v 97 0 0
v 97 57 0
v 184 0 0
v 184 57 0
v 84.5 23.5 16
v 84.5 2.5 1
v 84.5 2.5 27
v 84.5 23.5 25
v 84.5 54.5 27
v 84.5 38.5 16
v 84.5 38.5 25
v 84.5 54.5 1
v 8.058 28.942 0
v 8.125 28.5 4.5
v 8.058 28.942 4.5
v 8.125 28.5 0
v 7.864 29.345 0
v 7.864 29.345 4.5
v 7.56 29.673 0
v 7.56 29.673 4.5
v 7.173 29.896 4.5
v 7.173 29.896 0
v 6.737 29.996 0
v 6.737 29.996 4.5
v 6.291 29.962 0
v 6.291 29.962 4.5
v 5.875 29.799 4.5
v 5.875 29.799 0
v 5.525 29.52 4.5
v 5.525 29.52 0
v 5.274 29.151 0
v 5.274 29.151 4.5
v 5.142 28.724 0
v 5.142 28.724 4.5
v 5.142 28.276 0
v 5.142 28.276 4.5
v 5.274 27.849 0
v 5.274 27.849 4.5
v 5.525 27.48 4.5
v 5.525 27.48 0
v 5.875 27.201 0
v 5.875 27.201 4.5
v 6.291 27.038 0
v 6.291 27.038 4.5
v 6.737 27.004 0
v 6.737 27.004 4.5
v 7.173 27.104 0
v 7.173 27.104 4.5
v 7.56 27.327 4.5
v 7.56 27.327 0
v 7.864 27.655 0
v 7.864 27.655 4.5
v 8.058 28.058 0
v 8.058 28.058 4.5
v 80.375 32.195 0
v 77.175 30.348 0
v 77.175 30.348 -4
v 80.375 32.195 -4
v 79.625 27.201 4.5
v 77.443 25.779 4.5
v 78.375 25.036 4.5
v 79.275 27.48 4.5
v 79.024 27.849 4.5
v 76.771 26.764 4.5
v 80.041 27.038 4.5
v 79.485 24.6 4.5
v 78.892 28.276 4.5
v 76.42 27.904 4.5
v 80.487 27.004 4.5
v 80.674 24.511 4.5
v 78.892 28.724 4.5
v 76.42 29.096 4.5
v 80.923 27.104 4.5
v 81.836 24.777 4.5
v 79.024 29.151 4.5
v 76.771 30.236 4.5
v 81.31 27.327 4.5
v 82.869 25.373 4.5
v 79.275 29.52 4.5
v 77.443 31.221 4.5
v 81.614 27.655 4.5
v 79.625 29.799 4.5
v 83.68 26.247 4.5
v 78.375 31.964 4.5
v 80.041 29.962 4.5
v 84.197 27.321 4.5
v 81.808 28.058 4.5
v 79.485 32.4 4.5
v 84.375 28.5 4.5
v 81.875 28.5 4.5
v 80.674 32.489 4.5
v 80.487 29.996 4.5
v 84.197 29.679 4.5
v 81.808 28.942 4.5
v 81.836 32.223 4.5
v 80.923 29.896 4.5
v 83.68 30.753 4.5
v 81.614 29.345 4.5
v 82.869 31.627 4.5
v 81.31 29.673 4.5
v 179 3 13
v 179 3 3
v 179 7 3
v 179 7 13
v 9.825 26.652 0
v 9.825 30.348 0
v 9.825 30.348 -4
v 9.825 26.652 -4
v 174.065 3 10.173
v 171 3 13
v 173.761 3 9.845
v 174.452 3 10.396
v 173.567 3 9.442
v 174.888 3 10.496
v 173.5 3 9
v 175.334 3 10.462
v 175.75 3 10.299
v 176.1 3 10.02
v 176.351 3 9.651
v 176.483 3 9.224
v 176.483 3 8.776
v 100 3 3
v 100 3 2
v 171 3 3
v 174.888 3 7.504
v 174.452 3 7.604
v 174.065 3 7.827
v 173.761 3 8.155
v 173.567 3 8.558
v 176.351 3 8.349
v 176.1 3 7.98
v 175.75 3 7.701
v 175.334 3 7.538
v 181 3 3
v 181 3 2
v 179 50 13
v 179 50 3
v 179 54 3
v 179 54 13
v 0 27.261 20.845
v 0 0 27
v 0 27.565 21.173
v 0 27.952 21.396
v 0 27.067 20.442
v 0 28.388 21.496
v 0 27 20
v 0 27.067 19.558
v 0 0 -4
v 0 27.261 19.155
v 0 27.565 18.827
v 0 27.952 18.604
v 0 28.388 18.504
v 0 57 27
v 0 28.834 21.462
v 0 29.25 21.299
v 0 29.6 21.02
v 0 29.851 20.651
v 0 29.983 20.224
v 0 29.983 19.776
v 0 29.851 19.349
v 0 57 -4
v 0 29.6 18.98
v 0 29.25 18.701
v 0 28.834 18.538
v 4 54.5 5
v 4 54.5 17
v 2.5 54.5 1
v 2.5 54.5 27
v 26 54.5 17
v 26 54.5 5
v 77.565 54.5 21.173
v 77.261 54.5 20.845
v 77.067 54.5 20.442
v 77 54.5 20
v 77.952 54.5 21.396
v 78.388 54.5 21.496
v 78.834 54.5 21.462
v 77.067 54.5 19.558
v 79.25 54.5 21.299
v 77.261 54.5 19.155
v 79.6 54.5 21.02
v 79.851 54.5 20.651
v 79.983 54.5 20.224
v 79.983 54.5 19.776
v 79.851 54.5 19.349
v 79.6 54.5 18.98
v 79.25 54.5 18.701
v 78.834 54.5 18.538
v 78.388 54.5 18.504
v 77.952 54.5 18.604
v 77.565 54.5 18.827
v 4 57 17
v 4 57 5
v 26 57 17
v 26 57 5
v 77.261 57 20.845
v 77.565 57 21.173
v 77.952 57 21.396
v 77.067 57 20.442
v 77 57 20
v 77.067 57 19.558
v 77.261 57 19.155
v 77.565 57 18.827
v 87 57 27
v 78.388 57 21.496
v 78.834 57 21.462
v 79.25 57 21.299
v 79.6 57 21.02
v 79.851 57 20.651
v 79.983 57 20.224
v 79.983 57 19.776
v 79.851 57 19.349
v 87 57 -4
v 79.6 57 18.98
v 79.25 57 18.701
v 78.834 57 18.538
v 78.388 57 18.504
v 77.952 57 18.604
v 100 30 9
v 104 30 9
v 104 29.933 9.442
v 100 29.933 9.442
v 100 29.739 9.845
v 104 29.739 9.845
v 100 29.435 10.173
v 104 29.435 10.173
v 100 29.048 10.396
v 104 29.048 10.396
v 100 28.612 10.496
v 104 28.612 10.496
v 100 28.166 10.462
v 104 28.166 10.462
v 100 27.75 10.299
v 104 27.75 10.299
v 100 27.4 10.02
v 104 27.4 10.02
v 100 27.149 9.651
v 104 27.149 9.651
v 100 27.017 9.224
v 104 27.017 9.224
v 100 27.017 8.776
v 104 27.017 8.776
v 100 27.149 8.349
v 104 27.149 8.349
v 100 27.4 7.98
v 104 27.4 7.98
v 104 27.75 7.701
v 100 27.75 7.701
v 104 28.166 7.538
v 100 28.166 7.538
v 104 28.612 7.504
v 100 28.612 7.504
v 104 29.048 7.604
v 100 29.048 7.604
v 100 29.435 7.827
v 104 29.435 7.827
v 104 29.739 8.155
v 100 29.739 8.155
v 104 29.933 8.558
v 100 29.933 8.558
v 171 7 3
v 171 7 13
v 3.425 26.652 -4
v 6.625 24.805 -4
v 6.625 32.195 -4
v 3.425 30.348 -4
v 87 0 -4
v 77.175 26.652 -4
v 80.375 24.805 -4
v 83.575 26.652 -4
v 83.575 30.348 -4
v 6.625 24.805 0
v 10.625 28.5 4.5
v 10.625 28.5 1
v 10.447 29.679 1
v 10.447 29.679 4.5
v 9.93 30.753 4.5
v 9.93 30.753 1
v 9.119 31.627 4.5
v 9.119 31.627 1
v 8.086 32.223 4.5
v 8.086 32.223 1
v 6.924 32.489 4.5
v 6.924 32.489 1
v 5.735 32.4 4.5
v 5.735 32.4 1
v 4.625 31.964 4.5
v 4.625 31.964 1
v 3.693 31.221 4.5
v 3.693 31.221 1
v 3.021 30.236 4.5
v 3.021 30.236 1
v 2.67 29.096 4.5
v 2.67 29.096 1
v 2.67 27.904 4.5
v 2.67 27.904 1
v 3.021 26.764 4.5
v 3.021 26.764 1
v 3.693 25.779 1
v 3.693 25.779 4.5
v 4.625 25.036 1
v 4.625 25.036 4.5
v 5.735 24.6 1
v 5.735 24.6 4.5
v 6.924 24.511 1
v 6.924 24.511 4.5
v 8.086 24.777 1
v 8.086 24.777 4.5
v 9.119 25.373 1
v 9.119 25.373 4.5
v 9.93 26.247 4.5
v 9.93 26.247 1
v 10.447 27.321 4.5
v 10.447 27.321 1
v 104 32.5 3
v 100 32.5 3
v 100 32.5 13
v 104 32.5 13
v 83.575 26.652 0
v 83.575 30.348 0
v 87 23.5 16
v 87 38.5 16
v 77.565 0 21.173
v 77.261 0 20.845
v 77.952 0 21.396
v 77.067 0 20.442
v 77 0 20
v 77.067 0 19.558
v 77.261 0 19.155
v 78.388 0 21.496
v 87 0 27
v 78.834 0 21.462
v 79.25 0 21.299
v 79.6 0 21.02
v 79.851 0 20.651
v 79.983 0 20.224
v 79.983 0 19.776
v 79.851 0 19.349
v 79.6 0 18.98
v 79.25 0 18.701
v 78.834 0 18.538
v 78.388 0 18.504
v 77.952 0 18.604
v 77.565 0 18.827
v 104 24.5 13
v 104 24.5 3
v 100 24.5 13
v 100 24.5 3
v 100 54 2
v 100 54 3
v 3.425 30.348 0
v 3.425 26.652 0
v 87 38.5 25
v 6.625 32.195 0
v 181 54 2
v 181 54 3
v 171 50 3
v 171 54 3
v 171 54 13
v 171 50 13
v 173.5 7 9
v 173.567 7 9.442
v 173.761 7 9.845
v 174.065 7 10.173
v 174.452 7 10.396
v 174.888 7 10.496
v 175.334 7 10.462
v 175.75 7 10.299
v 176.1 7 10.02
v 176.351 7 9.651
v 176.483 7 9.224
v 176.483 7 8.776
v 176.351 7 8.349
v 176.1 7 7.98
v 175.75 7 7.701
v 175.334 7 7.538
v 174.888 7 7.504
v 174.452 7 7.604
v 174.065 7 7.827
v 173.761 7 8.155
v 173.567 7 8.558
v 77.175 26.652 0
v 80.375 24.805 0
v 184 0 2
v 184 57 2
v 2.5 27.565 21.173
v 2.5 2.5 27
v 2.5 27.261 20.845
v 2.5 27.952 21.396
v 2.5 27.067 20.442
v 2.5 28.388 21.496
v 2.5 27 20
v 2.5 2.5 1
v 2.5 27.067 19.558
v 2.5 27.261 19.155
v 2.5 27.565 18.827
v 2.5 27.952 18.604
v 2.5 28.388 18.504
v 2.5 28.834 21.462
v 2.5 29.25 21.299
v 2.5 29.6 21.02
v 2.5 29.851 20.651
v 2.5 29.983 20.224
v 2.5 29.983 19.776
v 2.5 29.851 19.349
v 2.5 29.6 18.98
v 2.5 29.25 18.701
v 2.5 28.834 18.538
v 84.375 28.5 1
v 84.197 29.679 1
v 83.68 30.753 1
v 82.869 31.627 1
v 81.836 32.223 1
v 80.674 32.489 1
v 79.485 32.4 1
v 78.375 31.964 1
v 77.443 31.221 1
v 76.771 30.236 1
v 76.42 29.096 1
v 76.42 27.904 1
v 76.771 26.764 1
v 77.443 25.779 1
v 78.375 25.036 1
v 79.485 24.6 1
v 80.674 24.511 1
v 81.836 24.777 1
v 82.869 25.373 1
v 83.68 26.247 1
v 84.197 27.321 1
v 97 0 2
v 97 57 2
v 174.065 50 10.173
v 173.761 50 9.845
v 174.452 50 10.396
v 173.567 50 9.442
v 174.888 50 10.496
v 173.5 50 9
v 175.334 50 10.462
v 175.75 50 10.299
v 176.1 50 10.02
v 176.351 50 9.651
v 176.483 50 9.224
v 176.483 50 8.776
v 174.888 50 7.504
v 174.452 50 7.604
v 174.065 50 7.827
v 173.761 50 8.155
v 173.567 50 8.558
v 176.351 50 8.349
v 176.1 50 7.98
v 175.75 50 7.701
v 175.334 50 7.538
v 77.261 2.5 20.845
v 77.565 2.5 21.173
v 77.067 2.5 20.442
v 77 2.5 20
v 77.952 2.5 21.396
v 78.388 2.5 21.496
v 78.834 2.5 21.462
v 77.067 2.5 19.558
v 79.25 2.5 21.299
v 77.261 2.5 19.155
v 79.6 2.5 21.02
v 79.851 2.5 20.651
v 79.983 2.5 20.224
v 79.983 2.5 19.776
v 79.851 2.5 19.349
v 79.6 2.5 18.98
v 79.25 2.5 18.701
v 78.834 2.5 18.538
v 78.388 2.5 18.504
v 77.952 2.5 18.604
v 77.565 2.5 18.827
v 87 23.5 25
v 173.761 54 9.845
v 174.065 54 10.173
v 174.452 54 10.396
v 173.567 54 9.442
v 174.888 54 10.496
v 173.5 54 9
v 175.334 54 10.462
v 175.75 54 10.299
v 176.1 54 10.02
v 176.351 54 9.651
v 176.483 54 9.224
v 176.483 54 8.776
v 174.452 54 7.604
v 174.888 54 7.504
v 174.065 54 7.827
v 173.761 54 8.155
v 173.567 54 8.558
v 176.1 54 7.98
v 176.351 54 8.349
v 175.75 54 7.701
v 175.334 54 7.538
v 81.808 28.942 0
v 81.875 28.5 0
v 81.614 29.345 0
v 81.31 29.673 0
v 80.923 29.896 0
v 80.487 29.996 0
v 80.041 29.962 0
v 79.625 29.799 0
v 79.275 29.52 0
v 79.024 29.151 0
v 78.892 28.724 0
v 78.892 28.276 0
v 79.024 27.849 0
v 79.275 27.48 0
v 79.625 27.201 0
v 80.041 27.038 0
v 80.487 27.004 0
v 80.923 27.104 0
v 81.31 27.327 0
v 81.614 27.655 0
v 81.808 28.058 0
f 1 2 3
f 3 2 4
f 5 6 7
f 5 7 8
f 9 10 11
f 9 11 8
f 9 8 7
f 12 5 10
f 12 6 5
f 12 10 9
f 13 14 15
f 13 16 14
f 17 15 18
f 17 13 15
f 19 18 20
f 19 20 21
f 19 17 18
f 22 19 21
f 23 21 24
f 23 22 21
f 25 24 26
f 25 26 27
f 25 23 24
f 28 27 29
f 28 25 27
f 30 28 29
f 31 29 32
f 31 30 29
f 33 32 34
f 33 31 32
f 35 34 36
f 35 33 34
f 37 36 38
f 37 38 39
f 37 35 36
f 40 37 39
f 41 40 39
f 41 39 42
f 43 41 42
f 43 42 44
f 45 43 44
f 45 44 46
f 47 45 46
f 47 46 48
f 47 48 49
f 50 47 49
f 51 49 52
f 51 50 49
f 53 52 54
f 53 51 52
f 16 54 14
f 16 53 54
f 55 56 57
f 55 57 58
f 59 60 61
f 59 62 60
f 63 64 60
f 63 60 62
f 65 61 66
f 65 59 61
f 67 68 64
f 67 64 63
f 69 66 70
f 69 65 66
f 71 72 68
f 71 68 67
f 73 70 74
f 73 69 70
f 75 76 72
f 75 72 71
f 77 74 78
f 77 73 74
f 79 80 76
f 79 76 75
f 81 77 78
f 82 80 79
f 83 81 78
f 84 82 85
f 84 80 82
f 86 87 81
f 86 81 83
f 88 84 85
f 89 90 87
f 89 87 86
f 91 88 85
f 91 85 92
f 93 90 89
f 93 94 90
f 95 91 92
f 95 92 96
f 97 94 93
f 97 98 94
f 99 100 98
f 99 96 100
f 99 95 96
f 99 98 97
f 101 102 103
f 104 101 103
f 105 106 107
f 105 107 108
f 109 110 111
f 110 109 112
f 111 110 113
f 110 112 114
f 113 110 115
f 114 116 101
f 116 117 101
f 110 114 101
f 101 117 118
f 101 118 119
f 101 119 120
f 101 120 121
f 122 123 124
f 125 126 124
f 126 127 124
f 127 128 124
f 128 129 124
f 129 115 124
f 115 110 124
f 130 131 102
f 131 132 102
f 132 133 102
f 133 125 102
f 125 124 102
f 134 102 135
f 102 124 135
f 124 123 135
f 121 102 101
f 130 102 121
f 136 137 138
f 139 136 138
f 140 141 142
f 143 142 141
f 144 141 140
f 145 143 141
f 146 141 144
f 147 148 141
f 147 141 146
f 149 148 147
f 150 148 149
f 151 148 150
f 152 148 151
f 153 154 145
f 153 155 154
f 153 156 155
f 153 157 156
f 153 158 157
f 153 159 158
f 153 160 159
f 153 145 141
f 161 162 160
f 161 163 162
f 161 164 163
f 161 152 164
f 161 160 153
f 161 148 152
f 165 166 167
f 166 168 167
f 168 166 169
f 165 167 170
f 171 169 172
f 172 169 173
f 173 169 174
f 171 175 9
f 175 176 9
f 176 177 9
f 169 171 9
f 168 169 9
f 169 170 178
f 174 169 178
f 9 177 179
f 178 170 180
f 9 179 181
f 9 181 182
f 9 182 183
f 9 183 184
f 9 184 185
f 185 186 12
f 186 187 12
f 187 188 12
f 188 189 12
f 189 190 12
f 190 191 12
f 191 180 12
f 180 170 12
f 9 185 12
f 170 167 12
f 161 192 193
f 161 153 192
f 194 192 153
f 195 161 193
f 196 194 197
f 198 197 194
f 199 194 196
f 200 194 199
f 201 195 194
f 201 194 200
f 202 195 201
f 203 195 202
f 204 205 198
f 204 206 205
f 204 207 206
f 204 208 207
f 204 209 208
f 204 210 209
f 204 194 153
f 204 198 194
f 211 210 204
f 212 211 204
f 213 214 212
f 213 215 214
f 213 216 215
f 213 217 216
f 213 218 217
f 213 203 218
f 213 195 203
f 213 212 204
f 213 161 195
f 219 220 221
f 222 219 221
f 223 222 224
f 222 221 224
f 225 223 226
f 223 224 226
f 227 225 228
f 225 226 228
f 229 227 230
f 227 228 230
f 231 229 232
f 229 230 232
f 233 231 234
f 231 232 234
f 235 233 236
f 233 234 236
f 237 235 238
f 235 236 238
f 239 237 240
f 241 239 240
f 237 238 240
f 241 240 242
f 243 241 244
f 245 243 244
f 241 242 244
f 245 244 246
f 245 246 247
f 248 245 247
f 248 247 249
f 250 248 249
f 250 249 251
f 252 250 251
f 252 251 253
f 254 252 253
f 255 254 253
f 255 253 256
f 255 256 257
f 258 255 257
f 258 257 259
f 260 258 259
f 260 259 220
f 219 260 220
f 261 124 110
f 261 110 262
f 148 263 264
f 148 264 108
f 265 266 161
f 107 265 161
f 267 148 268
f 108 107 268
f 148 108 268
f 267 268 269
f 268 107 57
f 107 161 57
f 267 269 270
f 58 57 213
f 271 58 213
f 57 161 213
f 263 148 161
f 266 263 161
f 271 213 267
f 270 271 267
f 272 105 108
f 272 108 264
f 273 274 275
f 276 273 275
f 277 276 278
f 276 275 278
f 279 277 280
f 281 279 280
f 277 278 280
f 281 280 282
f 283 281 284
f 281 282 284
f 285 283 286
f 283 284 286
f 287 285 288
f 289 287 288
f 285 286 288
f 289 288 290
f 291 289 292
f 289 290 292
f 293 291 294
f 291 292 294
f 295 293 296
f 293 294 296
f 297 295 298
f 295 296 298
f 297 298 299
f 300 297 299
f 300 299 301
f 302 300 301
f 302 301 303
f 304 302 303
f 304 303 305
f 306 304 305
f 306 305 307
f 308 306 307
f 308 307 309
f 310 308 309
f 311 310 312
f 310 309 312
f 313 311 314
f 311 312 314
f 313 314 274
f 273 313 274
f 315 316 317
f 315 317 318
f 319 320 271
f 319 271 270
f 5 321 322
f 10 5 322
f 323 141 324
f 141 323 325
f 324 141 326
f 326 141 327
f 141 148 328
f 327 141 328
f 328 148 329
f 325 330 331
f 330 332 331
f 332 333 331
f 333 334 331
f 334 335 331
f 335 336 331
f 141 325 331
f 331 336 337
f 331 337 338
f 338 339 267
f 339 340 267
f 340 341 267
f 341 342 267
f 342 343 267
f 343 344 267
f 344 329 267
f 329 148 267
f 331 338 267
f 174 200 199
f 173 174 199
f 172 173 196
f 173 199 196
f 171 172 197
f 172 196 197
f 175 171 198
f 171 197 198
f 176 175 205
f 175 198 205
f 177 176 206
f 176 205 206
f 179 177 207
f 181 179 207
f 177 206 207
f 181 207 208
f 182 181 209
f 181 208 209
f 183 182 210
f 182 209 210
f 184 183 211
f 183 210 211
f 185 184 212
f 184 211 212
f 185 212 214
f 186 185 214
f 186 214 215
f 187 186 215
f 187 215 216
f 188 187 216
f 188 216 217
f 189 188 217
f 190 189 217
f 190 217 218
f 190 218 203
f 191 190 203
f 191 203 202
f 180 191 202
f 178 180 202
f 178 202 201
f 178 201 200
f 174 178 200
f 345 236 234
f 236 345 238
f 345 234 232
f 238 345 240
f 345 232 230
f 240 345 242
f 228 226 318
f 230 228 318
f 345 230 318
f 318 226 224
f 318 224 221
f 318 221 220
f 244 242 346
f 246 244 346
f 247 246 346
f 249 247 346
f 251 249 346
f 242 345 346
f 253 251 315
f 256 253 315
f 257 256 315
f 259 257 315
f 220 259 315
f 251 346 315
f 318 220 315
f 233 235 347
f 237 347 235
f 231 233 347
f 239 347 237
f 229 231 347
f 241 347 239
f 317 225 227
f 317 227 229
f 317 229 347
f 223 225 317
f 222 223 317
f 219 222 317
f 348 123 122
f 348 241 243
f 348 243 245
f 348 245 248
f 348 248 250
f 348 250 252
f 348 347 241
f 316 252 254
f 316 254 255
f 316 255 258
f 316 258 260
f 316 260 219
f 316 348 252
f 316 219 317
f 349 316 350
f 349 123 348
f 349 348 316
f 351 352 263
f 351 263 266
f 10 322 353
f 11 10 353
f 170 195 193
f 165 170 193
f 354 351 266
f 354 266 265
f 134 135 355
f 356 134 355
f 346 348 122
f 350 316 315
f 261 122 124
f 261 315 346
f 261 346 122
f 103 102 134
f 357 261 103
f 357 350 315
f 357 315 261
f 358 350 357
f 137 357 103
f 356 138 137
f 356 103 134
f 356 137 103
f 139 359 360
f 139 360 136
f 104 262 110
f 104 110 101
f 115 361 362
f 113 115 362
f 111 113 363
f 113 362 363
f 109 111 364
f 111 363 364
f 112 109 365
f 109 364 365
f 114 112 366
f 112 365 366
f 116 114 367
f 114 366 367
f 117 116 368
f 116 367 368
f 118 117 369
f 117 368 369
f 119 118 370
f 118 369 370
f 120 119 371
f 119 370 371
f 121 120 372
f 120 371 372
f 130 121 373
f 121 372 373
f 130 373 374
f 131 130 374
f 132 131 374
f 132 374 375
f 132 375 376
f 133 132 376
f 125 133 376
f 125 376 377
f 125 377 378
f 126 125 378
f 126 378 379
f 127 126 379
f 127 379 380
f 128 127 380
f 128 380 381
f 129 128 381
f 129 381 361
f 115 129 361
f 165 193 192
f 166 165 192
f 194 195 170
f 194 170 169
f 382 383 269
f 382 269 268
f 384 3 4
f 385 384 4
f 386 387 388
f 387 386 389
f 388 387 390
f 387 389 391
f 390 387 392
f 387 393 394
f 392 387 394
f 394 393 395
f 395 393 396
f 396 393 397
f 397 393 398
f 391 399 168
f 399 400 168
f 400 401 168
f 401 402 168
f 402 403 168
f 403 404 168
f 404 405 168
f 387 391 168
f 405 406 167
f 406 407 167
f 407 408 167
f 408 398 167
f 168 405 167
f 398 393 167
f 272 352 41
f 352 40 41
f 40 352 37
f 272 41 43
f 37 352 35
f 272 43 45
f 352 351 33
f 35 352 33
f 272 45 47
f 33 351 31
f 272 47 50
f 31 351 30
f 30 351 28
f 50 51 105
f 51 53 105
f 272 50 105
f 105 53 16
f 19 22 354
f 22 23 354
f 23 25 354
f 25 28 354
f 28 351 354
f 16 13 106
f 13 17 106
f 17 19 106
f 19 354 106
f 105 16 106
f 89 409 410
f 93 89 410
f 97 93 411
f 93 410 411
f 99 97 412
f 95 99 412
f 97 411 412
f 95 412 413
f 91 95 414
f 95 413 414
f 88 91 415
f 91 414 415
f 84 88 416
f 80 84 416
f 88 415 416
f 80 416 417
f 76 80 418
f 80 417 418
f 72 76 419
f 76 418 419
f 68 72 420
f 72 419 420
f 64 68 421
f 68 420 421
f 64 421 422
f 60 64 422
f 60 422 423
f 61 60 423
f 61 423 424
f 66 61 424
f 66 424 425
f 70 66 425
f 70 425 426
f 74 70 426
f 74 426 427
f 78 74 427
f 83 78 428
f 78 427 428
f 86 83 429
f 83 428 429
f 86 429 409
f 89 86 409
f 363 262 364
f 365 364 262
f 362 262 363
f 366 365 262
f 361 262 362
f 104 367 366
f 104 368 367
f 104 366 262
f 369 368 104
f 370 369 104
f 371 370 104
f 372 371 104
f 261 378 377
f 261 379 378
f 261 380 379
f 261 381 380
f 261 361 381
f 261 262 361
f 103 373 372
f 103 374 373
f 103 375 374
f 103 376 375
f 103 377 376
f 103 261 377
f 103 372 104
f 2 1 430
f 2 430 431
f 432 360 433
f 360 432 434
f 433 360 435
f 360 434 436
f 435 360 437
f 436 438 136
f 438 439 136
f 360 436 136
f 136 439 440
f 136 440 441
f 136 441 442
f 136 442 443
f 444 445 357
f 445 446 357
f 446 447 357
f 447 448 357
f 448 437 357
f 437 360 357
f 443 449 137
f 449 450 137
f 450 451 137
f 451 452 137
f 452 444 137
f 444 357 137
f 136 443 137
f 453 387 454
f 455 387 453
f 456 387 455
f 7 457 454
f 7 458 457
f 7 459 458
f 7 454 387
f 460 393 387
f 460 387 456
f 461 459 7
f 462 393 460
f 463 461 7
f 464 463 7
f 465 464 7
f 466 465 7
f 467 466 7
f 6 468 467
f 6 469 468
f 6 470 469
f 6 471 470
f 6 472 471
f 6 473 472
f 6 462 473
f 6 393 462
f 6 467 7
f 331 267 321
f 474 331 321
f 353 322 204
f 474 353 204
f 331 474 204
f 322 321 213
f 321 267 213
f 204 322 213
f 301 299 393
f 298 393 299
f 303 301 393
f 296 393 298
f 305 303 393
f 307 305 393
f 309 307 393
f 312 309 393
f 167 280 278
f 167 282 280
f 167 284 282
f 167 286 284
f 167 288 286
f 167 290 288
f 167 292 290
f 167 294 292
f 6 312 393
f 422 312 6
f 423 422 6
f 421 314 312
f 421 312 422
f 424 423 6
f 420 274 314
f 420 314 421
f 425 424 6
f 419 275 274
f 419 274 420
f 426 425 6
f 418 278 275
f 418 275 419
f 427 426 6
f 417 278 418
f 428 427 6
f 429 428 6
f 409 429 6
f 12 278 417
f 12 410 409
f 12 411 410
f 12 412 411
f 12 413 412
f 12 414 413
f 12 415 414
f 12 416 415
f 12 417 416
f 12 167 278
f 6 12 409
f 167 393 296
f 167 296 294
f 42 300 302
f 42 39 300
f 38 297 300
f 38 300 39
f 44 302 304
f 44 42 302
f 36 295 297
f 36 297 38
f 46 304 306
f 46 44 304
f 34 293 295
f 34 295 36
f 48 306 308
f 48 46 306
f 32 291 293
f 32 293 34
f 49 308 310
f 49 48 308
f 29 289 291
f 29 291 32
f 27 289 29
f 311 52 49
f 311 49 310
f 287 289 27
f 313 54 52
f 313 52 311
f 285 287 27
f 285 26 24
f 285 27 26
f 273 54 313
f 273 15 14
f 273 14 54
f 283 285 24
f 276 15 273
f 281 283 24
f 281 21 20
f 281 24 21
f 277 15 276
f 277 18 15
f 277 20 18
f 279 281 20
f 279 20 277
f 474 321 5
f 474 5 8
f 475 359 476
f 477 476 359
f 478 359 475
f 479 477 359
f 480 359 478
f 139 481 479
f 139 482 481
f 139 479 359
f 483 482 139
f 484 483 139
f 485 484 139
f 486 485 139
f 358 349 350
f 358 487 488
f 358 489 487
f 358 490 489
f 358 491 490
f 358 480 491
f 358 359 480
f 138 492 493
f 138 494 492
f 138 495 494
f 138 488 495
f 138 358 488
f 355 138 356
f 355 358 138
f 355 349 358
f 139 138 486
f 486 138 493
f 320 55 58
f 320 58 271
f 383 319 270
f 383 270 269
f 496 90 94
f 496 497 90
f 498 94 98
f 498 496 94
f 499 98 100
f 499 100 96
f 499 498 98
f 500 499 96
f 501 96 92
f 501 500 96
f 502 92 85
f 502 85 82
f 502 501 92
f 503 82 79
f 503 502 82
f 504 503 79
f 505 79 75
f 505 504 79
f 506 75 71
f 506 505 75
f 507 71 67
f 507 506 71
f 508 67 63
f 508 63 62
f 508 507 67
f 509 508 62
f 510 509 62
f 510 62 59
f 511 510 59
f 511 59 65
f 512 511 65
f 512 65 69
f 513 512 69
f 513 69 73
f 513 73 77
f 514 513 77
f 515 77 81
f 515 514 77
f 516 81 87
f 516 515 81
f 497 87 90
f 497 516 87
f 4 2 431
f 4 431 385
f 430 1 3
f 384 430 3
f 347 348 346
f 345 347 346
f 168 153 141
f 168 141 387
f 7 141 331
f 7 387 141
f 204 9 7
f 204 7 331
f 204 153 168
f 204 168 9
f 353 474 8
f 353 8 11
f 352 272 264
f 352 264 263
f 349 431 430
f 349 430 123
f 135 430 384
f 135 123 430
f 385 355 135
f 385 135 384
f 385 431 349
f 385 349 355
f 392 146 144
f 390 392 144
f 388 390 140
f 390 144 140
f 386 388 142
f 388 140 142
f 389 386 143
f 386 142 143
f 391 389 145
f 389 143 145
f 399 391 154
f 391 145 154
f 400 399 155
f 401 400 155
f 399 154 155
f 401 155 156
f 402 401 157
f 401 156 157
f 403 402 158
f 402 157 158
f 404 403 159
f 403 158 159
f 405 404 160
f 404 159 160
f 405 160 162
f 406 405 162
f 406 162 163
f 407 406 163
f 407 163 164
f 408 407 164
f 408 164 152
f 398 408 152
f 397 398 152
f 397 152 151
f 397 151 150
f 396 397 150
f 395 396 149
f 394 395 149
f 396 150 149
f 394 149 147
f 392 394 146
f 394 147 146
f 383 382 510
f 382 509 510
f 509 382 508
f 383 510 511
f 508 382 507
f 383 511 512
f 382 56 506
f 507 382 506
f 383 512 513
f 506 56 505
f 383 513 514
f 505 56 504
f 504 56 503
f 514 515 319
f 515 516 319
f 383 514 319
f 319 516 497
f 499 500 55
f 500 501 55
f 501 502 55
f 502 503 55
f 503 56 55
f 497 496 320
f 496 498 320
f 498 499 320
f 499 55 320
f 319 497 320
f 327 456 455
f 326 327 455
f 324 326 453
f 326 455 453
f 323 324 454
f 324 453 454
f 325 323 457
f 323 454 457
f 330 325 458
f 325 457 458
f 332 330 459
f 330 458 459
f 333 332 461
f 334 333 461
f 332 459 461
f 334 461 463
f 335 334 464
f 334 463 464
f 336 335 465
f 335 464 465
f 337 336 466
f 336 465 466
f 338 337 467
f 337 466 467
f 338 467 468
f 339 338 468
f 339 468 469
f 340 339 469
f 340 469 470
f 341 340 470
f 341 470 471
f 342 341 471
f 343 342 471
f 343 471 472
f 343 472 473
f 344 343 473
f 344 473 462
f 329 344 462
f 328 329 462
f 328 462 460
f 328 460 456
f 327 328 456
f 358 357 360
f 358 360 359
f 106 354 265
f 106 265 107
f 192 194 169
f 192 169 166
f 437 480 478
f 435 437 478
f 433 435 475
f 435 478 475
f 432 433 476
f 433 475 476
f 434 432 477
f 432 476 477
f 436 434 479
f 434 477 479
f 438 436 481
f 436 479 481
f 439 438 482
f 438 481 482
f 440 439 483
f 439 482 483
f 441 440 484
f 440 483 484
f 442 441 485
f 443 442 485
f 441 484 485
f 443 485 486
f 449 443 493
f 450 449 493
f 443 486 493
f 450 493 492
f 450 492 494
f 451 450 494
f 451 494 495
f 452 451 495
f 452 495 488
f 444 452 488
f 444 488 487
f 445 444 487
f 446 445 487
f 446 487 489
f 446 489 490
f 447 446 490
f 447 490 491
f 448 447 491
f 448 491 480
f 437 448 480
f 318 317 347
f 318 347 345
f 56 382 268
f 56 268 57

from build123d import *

# Parameters (mm, degrees)
F3_W      = 87
F3_H      = 57
F3_W_2    = 82
F3_H_2    = 52
F4_DEPTH  = 4
F3_R      = 1.5
F5_DEPTH  = 1
F7_R      = 4
F7_R_2    = 1.5
F8_DEPTH  = 3.5
F10_DEPTH = 27
F11_W     = 15
F11_H     = 9
F12_DEPTH = 2.5
F13_W     = 22
F13_H     = 12
F14_DEPTH = 2.5
F13_R     = 1.5
F15_DEPTH = 57.001
F3_W_3    = 81
F3_H_3    = 51
F18_DEPTH = 3
F19_DEPTH = 2
F20_W     = 8
F20_H     = 4
F20_W_2   = 4
F20_H_2   = 8
F21_DEPTH = 10
F22_R     = 1.5
F24_DEPTH = 54.001
F23_R     = 1.5
F25_DEPTH = 104.001
F26_R     = 1.5
F27_DEPTH = 2.5


with BuildPart() as f4:
    # F3 (on Top) → F4 (new body)
    with BuildSketch(Plane.XY):
        with Locations((43.5, 28.5)):
            Rectangle(F3_W, F3_H)
        with Locations((43.5, 28.5)):
            Rectangle(F3_W_2, F3_H_2, mode=Mode.SUBTRACT)
        with Locations((43.5, 28.5)):
            Rectangle(F3_W_2, F3_H_2)
        Polygon((6.625, 32.1950417228), (9.825, 30.3475208614), (9.825, 26.6524791386), (6.625, 24.8049582772), (3.425, 26.6524791386), (3.425, 30.3475208614), align=None, mode=Mode.SUBTRACT)
        Polygon((80.375, 32.1950417228), (83.575, 30.3475208614), (83.575, 26.6524791386), (80.375, 24.8049582772), (77.175, 26.6524791386), (77.175, 30.3475208614), align=None, mode=Mode.SUBTRACT)
    extrude(amount=-F4_DEPTH)

    # F3 (on Top) → F5 (join)
    with BuildSketch(Plane.XY):
        with Locations((43.5, 28.5)):
            Rectangle(F3_W, F3_H)
        with Locations((43.5, 28.5)):
            Rectangle(F3_W_2, F3_H_2, mode=Mode.SUBTRACT)
        with Locations((43.5, 28.5)):
            Rectangle(F3_W_2, F3_H_2)
        Polygon((6.625, 32.1950417228), (9.825, 30.3475208614), (9.825, 26.6524791386), (6.625, 24.8049582772), (3.425, 26.6524791386), (3.425, 30.3475208614), align=None, mode=Mode.SUBTRACT)
        Polygon((80.375, 32.1950417228), (83.575, 30.3475208614), (83.575, 26.6524791386), (80.375, 24.8049582772), (77.175, 26.6524791386), (77.175, 30.3475208614), align=None, mode=Mode.SUBTRACT)
        Polygon((9.825, 26.6524791386), (9.825, 30.3475208614), (6.625, 32.1950417228), (3.425, 30.3475208614), (3.425, 26.6524791386), (6.625, 24.8049582772), align=None)
        with Locations((6.625, 28.5)):
            Circle(F3_R, mode=Mode.SUBTRACT)
        Polygon((83.575, 26.6524791386), (83.575, 30.3475208614), (80.375, 32.1950417228), (77.175, 30.3475208614), (77.175, 26.6524791386), (80.375, 24.8049582772), align=None)
        with Locations((80.375, 28.5)):
            Circle(F3_R, mode=Mode.SUBTRACT)
    extrude(amount=F5_DEPTH)

    # F7 (on face) → F8 (join)
    with BuildSketch(Plane.XY.offset(1)):
        with Locations((6.625, 28.5)):
            Circle(F7_R)
        with Locations((6.625, 28.5)):
            Circle(F7_R_2, mode=Mode.SUBTRACT)
        with Locations((80.375, 28.5)):
            Circle(F7_R)
        with Locations((80.375, 28.5)):
            Circle(F7_R_2, mode=Mode.SUBTRACT)
    extrude(amount=F8_DEPTH)

    # F3 (on Top) → F10 (join)
    with BuildSketch(Plane.XY):
        with Locations((43.5, 28.5)):
            Rectangle(F3_W, F3_H)
        with Locations((43.5, 28.5)):
            Rectangle(F3_W_2, F3_H_2, mode=Mode.SUBTRACT)
    extrude(amount=F10_DEPTH)

    # F11 (on face) → F12 (cut, through all)
    with BuildSketch(Plane.YZ.offset(87)):
        with Locations((31, 20.5)):
            Rectangle(F11_W, F11_H)
    extrude(amount=-F12_DEPTH, mode=Mode.SUBTRACT)

    # F13 (on face) → F14 (cut)
    with BuildSketch(Plane(origin=(0, 57, 0), x_dir=(-1, 0, 0), z_dir=(0, 1, 0))):
        with Locations((-15, 11)):
            Rectangle(F13_W, F13_H)
    extrude(amount=-F14_DEPTH, mode=Mode.SUBTRACT)

    # F13 (on face) → F15 (cut, through all)
    with BuildSketch(Plane(origin=(0, 57, 0), x_dir=(-1, 0, 0), z_dir=(0, 1, 0))):
        with Locations((-78.5, 20)):
            Circle(F13_R)
    extrude(amount=-F15_DEPTH, mode=Mode.SUBTRACT)

    # F26 (on face) → F27 (cut, through all)
    with BuildSketch(Plane(origin=(0, 0, 0), x_dir=(0, -1, 0), z_dir=(-1, 0, 0))):
        with Locations((-28.5, 20)):
            Circle(F26_R)
    extrude(amount=-F27_DEPTH, mode=Mode.SUBTRACT)


with BuildPart() as f18:
    # F3 (on Top) → F18 (new body)
    with BuildSketch(Plane.XY):
        with Locations((140.5, 28.5)):
            Rectangle(F3_W_3, F3_H_3)
    extrude(amount=F18_DEPTH)

    # F3 (on Top) → F19 (join)
    with BuildSketch(Plane.XY):
        with Locations((140.5, 28.5)):
            Rectangle(F3_W, F3_H)
        with Locations((140.5, 28.5)):
            Rectangle(F3_W_3, F3_H_3, mode=Mode.SUBTRACT)
    extrude(amount=F19_DEPTH)

    # F20 (on face) → F21 (join)
    with BuildSketch(Plane.XY.offset(3)):
        with Locations((175, 52)):
            Rectangle(F20_W, F20_H)
        with Locations((175, 5)):
            Rectangle(F20_W, F20_H)
        with Locations((102, 28.5)):
            Rectangle(F20_W_2, F20_H_2)
    extrude(amount=F21_DEPTH)

    # F22 (on face) → F24 (cut, through all)
    with BuildSketch(Plane(origin=(0, 54, 0), x_dir=(-1, 0, 0), z_dir=(0, 1, 0))):
        with Locations((-175, 9)):
            Circle(F22_R)
    extrude(amount=-F24_DEPTH, mode=Mode.SUBTRACT)

    # F23 (on face) → F25 (cut, through all)
    with BuildSketch(Plane.YZ.offset(104)):
        with Locations((28.5, 9)):
            Circle(F23_R)
    extrude(amount=-F25_DEPTH, mode=Mode.SUBTRACT)


solid = Compound([f4.part, f18.part])
